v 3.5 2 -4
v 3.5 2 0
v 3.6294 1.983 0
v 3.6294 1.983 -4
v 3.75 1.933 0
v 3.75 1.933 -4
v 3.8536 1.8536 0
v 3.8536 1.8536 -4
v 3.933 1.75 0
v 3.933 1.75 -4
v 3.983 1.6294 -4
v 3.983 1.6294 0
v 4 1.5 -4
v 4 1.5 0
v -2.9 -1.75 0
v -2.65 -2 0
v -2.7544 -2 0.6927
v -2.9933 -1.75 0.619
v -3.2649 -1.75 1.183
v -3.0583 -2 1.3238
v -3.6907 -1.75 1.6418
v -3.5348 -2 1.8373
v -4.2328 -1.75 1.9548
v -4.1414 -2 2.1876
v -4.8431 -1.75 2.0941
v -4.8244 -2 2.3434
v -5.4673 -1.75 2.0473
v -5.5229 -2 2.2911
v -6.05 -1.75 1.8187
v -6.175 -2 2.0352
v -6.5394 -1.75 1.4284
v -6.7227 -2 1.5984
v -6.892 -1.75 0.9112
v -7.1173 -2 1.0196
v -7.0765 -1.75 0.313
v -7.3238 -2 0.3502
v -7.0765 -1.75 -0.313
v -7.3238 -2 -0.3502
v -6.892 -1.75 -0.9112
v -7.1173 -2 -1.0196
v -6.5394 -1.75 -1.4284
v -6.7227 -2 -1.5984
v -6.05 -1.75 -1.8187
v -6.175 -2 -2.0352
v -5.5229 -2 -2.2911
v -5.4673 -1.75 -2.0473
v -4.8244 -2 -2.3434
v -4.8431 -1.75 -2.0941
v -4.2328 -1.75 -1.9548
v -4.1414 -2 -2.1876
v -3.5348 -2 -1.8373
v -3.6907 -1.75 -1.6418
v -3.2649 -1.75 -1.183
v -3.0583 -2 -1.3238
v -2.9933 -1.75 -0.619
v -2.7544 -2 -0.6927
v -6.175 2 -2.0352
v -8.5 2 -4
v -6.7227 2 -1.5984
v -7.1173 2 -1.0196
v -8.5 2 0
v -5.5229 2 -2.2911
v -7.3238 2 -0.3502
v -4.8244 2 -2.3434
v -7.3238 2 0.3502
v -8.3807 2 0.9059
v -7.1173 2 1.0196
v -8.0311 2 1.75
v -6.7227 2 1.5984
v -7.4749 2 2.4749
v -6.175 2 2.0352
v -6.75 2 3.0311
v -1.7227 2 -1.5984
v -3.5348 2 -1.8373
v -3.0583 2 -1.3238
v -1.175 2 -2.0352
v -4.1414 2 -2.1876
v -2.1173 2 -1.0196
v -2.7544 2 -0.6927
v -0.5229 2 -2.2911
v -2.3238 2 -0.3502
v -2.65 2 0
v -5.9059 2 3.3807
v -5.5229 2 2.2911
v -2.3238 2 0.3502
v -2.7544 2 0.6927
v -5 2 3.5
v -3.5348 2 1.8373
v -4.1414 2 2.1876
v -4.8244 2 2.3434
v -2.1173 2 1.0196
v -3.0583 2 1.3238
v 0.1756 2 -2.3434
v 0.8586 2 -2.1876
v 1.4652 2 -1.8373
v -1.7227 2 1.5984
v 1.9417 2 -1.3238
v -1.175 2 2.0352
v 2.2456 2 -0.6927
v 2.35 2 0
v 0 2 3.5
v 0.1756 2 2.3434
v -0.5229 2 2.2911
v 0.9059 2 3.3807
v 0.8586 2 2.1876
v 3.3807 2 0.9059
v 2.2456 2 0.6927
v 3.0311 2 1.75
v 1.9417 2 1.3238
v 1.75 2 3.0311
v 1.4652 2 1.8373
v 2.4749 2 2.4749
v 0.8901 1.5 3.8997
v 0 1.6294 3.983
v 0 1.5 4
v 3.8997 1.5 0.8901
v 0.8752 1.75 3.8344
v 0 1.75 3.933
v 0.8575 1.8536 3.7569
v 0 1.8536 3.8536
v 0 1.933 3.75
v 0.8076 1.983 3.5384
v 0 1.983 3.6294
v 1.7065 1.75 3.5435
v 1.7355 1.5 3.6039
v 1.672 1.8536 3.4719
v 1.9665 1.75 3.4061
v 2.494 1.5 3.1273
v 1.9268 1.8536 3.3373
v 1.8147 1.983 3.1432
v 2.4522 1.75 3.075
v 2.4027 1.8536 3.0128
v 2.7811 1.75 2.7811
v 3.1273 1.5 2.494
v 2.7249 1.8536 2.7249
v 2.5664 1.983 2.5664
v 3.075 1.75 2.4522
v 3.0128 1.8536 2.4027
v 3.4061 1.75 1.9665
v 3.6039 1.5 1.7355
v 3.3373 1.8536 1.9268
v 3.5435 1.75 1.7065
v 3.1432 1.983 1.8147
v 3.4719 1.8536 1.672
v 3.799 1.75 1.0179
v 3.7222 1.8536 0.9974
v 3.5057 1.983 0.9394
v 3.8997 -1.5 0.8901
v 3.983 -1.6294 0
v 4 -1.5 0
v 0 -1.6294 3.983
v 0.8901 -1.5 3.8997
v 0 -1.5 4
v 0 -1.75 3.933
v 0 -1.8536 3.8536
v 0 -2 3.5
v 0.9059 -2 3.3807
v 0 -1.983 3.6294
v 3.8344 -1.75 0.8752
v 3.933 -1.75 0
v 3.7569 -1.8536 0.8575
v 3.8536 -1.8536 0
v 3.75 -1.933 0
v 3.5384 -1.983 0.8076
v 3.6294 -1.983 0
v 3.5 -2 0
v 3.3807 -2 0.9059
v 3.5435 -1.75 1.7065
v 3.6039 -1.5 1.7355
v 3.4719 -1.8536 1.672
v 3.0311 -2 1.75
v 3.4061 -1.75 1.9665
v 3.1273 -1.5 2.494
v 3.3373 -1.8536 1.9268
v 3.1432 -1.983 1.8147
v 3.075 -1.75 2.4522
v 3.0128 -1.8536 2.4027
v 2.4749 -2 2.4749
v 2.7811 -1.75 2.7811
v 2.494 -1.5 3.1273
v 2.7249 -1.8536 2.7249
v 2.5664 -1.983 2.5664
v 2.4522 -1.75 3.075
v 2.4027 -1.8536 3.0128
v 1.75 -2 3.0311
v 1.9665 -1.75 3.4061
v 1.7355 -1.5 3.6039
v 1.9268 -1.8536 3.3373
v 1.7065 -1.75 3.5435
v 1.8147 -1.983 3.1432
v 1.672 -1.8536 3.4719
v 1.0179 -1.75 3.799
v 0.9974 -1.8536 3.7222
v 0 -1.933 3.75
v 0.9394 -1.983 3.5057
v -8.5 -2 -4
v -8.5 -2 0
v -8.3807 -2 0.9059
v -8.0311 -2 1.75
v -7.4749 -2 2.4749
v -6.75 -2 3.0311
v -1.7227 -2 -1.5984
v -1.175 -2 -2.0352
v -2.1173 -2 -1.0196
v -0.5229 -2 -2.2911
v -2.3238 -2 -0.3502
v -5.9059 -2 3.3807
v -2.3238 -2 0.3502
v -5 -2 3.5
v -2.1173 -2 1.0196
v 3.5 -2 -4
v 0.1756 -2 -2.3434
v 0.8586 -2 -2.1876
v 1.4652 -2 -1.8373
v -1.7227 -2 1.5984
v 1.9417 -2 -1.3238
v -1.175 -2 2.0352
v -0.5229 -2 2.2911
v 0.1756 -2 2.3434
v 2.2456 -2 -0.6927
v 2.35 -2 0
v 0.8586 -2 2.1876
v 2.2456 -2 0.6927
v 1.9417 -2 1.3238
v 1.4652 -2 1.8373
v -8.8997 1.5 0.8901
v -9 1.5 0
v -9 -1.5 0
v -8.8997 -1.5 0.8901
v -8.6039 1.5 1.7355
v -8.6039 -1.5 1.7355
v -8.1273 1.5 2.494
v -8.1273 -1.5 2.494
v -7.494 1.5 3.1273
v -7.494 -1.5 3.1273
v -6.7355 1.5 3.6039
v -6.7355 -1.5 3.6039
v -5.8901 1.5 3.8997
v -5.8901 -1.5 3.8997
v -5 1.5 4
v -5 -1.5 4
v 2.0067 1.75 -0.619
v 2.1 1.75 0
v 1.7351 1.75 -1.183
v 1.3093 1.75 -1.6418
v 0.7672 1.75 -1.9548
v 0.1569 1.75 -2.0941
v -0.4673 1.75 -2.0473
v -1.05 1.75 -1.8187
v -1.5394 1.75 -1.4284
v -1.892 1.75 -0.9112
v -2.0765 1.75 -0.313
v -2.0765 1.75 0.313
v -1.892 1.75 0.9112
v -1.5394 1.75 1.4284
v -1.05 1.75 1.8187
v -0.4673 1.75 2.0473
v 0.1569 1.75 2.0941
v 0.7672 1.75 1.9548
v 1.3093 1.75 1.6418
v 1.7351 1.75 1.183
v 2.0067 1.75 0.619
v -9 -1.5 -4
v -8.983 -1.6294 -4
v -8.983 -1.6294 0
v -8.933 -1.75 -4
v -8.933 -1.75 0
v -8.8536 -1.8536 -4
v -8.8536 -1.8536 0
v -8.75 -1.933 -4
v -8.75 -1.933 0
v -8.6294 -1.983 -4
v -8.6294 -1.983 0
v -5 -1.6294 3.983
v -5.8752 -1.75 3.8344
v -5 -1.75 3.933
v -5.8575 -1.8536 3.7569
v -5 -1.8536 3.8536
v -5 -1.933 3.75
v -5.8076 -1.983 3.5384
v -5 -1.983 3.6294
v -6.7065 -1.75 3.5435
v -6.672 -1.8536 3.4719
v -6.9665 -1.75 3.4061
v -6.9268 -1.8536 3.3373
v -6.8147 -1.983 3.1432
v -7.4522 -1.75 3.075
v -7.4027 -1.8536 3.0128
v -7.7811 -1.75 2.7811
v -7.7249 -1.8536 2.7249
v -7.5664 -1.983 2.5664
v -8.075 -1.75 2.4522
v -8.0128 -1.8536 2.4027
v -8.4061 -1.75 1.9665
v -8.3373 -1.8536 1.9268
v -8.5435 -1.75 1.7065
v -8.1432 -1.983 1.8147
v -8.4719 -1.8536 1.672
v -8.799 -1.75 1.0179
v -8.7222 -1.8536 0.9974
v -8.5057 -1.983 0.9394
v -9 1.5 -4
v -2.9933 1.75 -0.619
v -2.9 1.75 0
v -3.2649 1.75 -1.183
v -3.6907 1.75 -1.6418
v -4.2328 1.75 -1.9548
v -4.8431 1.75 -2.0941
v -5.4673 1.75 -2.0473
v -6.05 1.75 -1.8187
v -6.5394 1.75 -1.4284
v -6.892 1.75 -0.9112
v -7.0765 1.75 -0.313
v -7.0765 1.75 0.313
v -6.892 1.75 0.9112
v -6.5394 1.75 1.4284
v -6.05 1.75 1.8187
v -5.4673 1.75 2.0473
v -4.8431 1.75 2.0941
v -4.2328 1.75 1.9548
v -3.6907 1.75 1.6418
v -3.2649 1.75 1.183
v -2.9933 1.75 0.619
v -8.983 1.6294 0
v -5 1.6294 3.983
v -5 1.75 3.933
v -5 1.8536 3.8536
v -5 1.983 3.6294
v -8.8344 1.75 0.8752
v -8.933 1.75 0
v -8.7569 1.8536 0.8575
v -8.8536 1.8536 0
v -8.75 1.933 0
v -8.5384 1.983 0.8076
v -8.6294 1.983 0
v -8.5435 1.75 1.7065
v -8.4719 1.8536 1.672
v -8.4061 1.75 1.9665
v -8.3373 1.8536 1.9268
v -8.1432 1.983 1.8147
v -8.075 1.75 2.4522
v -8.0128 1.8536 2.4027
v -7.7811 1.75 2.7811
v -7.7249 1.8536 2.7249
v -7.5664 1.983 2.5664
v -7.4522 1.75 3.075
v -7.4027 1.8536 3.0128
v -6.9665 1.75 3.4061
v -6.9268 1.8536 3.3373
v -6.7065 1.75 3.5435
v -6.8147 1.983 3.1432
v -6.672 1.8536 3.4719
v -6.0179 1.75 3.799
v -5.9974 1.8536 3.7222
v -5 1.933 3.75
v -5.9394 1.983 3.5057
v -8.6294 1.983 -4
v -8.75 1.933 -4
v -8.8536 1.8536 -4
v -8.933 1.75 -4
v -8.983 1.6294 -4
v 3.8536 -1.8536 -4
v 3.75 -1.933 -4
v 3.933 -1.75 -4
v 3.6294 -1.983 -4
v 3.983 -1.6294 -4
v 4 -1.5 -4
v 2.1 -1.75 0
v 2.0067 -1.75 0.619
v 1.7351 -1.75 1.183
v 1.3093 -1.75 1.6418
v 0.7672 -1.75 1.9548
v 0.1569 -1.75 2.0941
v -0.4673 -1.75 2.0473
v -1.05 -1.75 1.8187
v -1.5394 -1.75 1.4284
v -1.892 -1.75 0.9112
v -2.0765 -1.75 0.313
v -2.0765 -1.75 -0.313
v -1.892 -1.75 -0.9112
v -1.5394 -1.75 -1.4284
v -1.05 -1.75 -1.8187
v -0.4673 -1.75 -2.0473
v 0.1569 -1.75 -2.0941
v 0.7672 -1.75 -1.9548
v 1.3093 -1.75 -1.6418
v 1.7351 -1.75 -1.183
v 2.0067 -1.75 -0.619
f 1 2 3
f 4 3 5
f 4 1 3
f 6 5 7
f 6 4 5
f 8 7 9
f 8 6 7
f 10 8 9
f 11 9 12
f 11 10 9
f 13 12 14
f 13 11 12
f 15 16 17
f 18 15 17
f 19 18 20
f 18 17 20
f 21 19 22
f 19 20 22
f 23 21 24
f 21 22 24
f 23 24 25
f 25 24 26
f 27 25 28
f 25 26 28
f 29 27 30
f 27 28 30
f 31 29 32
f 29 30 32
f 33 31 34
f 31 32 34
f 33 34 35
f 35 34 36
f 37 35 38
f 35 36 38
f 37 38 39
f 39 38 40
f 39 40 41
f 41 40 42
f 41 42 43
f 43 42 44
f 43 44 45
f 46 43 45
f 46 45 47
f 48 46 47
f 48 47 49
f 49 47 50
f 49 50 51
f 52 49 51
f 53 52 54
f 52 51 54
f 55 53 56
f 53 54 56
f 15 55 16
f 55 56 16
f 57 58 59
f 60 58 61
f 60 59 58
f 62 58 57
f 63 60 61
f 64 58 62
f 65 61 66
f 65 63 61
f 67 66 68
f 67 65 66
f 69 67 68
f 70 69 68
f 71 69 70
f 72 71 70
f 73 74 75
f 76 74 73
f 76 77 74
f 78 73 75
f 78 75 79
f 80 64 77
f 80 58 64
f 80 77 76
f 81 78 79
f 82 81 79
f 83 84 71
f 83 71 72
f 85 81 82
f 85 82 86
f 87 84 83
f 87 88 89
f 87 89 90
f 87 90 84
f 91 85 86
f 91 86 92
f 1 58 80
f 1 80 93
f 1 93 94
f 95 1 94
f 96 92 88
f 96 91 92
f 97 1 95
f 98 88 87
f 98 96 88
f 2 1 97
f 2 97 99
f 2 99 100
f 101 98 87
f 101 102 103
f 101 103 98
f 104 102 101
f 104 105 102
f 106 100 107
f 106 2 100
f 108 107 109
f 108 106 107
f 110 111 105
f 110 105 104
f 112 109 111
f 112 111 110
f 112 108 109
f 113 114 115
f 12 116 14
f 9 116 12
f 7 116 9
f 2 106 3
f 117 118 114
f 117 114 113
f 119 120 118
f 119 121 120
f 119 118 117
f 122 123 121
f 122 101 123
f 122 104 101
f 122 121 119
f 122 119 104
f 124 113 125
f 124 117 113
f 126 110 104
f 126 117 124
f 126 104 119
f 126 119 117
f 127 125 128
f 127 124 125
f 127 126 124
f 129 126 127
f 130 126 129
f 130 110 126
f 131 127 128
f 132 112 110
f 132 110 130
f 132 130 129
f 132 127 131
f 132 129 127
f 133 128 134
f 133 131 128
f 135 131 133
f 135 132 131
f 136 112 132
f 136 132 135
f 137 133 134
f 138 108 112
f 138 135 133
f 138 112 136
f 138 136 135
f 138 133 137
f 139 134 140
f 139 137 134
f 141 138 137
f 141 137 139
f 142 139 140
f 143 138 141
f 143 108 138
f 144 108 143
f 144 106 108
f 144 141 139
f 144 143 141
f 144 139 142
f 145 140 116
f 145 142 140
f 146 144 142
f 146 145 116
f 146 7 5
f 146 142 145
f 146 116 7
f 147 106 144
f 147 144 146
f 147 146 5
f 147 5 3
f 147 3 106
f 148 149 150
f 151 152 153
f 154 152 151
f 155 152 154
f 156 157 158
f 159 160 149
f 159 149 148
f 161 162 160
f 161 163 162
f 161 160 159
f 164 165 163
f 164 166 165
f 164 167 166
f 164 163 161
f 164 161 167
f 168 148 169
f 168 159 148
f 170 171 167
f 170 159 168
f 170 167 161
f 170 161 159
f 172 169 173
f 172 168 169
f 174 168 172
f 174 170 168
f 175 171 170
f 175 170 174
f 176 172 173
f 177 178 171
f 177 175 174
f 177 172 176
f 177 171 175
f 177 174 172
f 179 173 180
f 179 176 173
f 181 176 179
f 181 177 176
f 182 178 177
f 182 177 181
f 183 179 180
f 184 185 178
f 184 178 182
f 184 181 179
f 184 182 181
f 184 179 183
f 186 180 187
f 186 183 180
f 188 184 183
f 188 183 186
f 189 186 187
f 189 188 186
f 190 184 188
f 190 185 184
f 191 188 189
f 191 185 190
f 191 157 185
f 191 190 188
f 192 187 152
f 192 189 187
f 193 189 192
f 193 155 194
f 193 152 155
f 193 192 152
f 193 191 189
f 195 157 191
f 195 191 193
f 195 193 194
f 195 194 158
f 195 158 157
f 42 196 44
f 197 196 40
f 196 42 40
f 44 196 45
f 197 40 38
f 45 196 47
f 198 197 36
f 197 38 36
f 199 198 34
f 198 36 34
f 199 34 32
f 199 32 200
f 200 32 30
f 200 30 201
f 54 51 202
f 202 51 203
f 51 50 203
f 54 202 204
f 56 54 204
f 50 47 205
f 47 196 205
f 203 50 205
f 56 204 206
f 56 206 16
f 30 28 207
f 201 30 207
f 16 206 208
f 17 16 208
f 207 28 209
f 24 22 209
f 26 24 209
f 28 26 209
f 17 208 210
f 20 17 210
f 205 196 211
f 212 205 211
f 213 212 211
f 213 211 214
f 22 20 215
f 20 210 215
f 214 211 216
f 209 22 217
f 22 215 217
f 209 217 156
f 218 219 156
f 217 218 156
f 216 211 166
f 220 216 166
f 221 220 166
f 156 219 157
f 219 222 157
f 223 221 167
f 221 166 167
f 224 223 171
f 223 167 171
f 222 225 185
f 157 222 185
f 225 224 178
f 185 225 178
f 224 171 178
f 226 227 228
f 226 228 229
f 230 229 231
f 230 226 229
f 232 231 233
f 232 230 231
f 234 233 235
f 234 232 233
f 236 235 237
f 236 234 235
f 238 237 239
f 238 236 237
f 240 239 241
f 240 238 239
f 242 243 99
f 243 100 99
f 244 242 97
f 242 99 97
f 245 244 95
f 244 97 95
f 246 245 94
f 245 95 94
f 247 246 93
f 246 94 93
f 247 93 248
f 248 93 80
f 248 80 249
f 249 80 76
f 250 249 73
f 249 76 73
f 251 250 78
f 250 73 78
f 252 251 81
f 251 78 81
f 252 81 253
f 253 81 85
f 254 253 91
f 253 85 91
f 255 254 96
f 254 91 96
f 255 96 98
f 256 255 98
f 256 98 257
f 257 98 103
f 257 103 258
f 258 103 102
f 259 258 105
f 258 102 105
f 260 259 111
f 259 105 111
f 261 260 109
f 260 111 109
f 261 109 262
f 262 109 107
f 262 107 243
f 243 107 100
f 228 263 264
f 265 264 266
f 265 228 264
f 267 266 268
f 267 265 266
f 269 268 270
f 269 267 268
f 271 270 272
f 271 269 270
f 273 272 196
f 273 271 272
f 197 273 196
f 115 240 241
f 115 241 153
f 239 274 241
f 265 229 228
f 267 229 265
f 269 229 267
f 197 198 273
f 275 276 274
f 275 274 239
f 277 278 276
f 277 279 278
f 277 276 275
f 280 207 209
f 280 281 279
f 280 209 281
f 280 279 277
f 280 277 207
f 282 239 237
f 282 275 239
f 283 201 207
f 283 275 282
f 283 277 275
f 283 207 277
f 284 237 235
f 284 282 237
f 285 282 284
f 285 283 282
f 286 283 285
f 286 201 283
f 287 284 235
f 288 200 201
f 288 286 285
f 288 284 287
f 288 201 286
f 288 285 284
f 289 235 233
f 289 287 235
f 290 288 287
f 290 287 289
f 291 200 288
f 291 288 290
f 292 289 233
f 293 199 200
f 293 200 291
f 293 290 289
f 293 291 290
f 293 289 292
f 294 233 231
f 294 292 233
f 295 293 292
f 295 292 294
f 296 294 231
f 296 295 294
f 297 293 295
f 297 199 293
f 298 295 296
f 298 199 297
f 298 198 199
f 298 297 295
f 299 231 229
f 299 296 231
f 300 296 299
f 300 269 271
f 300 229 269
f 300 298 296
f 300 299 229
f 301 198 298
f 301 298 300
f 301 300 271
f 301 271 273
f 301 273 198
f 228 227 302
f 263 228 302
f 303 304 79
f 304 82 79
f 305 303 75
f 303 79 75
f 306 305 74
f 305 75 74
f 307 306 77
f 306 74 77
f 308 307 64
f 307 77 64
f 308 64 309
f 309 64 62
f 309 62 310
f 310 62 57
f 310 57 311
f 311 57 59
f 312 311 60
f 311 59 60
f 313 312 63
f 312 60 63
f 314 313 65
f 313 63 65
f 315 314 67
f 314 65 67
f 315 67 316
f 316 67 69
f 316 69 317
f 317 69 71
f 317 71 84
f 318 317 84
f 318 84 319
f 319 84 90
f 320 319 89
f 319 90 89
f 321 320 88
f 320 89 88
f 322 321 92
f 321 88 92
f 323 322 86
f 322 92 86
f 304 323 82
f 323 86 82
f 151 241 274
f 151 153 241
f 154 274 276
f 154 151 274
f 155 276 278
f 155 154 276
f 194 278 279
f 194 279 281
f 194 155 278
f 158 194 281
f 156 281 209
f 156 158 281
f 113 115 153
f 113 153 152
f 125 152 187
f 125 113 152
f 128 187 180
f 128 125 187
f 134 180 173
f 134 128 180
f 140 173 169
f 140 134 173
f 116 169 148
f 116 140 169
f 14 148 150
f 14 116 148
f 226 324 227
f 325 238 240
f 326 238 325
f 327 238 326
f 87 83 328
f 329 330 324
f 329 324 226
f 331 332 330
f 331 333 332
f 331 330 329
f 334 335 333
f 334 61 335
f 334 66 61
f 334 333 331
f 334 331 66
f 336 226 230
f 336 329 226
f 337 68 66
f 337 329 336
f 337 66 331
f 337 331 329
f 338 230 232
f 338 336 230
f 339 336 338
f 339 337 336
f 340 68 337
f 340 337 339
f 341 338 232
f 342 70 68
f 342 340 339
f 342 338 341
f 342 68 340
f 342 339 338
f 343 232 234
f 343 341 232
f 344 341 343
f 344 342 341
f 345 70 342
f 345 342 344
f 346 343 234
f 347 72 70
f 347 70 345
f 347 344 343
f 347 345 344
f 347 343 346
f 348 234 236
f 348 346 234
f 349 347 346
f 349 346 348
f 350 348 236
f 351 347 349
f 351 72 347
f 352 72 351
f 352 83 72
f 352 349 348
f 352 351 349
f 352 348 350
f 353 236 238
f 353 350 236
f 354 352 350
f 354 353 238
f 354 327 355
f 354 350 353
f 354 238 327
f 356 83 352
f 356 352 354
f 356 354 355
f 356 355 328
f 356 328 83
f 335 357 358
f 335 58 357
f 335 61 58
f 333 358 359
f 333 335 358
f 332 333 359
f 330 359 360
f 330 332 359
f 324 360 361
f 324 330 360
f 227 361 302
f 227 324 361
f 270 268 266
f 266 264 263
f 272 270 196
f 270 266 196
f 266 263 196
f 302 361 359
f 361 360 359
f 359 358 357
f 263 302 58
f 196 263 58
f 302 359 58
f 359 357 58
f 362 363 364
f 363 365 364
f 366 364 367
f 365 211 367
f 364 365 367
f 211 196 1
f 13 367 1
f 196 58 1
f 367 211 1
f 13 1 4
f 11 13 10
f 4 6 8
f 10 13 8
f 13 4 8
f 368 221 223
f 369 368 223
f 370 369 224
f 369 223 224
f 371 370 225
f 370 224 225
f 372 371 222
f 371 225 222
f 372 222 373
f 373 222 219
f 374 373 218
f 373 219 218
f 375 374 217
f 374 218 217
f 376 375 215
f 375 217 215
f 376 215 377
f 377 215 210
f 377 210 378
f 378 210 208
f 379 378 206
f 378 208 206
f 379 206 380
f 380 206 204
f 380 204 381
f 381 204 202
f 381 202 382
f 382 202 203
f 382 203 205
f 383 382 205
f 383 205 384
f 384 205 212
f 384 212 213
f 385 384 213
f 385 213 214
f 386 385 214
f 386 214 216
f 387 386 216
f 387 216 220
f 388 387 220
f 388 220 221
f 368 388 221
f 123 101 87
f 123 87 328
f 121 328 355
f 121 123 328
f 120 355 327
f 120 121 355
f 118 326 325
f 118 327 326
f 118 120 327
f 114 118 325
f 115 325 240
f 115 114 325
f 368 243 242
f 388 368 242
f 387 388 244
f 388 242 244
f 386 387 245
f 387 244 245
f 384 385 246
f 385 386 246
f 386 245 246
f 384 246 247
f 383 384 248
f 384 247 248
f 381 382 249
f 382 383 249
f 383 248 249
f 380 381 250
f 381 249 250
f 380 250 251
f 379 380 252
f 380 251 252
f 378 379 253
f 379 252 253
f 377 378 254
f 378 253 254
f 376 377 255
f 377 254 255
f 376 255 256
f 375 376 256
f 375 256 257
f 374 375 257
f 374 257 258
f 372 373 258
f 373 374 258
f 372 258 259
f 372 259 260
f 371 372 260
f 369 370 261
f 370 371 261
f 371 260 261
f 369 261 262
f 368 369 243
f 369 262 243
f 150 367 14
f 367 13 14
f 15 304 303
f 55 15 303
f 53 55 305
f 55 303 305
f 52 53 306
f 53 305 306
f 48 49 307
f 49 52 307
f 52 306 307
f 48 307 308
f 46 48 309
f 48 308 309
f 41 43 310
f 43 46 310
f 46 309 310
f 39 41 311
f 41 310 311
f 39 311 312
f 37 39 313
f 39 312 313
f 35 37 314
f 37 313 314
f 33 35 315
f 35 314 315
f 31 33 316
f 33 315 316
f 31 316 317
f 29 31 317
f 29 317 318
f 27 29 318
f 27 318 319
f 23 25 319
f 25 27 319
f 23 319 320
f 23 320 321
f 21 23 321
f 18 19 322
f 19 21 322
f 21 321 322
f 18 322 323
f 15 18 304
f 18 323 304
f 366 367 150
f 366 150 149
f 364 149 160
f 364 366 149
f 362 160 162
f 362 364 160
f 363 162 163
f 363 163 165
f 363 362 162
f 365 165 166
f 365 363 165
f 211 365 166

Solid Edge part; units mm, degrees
sketch "Sketch1" plane through (0, 0, 0) normal (0, -1, 0) x (1, 0, 0)
  circle A0 centre (0, 0) radius 2.1
  circle A1 centre (-5, 0) radius 2.1
  line L0 (-5, 4) -> (0, 4)
  line L1 (4, -4) -> (4, 0)
  line L2 (0, -4) -> (4, -4)
  line L3 (-5, -4) -> (0, -4)
  line L4 (-9, -4) -> (-5, -4)
  line L5 (-9, 0) -> (-9, -4)
  arc A2 (-9, 0) -> (-5, 4) centre (-5, 0) cw
  arc A3 (0, 4) -> (4, 0) centre (0, 0) cw
extrude "Protrusion1" add sketch "Sketch1" along normal mid plane 4
fillet "Verrundung_1" radius 0.5 10 edges at (-2.5, -2, 4) (2.8284, -2, 2.8284) (4, -2, -2) (-7.8284, -2, 2.8284) (-9, -2, -2) (2.8284, 2, 2.8284) (4, 2, -2) (-2.5, 2, 4) (-7.8284, 2, 2.8284) (-9, 2, -2)
chamfer "Fase_1" distance 0.25 angle 45 4 edges at (-7.1, -2, 0) (-7.1, 2, 0) (-2.1, -2, 0) (-2.1, 2, 0)
properties part number "086" material "PLA"
